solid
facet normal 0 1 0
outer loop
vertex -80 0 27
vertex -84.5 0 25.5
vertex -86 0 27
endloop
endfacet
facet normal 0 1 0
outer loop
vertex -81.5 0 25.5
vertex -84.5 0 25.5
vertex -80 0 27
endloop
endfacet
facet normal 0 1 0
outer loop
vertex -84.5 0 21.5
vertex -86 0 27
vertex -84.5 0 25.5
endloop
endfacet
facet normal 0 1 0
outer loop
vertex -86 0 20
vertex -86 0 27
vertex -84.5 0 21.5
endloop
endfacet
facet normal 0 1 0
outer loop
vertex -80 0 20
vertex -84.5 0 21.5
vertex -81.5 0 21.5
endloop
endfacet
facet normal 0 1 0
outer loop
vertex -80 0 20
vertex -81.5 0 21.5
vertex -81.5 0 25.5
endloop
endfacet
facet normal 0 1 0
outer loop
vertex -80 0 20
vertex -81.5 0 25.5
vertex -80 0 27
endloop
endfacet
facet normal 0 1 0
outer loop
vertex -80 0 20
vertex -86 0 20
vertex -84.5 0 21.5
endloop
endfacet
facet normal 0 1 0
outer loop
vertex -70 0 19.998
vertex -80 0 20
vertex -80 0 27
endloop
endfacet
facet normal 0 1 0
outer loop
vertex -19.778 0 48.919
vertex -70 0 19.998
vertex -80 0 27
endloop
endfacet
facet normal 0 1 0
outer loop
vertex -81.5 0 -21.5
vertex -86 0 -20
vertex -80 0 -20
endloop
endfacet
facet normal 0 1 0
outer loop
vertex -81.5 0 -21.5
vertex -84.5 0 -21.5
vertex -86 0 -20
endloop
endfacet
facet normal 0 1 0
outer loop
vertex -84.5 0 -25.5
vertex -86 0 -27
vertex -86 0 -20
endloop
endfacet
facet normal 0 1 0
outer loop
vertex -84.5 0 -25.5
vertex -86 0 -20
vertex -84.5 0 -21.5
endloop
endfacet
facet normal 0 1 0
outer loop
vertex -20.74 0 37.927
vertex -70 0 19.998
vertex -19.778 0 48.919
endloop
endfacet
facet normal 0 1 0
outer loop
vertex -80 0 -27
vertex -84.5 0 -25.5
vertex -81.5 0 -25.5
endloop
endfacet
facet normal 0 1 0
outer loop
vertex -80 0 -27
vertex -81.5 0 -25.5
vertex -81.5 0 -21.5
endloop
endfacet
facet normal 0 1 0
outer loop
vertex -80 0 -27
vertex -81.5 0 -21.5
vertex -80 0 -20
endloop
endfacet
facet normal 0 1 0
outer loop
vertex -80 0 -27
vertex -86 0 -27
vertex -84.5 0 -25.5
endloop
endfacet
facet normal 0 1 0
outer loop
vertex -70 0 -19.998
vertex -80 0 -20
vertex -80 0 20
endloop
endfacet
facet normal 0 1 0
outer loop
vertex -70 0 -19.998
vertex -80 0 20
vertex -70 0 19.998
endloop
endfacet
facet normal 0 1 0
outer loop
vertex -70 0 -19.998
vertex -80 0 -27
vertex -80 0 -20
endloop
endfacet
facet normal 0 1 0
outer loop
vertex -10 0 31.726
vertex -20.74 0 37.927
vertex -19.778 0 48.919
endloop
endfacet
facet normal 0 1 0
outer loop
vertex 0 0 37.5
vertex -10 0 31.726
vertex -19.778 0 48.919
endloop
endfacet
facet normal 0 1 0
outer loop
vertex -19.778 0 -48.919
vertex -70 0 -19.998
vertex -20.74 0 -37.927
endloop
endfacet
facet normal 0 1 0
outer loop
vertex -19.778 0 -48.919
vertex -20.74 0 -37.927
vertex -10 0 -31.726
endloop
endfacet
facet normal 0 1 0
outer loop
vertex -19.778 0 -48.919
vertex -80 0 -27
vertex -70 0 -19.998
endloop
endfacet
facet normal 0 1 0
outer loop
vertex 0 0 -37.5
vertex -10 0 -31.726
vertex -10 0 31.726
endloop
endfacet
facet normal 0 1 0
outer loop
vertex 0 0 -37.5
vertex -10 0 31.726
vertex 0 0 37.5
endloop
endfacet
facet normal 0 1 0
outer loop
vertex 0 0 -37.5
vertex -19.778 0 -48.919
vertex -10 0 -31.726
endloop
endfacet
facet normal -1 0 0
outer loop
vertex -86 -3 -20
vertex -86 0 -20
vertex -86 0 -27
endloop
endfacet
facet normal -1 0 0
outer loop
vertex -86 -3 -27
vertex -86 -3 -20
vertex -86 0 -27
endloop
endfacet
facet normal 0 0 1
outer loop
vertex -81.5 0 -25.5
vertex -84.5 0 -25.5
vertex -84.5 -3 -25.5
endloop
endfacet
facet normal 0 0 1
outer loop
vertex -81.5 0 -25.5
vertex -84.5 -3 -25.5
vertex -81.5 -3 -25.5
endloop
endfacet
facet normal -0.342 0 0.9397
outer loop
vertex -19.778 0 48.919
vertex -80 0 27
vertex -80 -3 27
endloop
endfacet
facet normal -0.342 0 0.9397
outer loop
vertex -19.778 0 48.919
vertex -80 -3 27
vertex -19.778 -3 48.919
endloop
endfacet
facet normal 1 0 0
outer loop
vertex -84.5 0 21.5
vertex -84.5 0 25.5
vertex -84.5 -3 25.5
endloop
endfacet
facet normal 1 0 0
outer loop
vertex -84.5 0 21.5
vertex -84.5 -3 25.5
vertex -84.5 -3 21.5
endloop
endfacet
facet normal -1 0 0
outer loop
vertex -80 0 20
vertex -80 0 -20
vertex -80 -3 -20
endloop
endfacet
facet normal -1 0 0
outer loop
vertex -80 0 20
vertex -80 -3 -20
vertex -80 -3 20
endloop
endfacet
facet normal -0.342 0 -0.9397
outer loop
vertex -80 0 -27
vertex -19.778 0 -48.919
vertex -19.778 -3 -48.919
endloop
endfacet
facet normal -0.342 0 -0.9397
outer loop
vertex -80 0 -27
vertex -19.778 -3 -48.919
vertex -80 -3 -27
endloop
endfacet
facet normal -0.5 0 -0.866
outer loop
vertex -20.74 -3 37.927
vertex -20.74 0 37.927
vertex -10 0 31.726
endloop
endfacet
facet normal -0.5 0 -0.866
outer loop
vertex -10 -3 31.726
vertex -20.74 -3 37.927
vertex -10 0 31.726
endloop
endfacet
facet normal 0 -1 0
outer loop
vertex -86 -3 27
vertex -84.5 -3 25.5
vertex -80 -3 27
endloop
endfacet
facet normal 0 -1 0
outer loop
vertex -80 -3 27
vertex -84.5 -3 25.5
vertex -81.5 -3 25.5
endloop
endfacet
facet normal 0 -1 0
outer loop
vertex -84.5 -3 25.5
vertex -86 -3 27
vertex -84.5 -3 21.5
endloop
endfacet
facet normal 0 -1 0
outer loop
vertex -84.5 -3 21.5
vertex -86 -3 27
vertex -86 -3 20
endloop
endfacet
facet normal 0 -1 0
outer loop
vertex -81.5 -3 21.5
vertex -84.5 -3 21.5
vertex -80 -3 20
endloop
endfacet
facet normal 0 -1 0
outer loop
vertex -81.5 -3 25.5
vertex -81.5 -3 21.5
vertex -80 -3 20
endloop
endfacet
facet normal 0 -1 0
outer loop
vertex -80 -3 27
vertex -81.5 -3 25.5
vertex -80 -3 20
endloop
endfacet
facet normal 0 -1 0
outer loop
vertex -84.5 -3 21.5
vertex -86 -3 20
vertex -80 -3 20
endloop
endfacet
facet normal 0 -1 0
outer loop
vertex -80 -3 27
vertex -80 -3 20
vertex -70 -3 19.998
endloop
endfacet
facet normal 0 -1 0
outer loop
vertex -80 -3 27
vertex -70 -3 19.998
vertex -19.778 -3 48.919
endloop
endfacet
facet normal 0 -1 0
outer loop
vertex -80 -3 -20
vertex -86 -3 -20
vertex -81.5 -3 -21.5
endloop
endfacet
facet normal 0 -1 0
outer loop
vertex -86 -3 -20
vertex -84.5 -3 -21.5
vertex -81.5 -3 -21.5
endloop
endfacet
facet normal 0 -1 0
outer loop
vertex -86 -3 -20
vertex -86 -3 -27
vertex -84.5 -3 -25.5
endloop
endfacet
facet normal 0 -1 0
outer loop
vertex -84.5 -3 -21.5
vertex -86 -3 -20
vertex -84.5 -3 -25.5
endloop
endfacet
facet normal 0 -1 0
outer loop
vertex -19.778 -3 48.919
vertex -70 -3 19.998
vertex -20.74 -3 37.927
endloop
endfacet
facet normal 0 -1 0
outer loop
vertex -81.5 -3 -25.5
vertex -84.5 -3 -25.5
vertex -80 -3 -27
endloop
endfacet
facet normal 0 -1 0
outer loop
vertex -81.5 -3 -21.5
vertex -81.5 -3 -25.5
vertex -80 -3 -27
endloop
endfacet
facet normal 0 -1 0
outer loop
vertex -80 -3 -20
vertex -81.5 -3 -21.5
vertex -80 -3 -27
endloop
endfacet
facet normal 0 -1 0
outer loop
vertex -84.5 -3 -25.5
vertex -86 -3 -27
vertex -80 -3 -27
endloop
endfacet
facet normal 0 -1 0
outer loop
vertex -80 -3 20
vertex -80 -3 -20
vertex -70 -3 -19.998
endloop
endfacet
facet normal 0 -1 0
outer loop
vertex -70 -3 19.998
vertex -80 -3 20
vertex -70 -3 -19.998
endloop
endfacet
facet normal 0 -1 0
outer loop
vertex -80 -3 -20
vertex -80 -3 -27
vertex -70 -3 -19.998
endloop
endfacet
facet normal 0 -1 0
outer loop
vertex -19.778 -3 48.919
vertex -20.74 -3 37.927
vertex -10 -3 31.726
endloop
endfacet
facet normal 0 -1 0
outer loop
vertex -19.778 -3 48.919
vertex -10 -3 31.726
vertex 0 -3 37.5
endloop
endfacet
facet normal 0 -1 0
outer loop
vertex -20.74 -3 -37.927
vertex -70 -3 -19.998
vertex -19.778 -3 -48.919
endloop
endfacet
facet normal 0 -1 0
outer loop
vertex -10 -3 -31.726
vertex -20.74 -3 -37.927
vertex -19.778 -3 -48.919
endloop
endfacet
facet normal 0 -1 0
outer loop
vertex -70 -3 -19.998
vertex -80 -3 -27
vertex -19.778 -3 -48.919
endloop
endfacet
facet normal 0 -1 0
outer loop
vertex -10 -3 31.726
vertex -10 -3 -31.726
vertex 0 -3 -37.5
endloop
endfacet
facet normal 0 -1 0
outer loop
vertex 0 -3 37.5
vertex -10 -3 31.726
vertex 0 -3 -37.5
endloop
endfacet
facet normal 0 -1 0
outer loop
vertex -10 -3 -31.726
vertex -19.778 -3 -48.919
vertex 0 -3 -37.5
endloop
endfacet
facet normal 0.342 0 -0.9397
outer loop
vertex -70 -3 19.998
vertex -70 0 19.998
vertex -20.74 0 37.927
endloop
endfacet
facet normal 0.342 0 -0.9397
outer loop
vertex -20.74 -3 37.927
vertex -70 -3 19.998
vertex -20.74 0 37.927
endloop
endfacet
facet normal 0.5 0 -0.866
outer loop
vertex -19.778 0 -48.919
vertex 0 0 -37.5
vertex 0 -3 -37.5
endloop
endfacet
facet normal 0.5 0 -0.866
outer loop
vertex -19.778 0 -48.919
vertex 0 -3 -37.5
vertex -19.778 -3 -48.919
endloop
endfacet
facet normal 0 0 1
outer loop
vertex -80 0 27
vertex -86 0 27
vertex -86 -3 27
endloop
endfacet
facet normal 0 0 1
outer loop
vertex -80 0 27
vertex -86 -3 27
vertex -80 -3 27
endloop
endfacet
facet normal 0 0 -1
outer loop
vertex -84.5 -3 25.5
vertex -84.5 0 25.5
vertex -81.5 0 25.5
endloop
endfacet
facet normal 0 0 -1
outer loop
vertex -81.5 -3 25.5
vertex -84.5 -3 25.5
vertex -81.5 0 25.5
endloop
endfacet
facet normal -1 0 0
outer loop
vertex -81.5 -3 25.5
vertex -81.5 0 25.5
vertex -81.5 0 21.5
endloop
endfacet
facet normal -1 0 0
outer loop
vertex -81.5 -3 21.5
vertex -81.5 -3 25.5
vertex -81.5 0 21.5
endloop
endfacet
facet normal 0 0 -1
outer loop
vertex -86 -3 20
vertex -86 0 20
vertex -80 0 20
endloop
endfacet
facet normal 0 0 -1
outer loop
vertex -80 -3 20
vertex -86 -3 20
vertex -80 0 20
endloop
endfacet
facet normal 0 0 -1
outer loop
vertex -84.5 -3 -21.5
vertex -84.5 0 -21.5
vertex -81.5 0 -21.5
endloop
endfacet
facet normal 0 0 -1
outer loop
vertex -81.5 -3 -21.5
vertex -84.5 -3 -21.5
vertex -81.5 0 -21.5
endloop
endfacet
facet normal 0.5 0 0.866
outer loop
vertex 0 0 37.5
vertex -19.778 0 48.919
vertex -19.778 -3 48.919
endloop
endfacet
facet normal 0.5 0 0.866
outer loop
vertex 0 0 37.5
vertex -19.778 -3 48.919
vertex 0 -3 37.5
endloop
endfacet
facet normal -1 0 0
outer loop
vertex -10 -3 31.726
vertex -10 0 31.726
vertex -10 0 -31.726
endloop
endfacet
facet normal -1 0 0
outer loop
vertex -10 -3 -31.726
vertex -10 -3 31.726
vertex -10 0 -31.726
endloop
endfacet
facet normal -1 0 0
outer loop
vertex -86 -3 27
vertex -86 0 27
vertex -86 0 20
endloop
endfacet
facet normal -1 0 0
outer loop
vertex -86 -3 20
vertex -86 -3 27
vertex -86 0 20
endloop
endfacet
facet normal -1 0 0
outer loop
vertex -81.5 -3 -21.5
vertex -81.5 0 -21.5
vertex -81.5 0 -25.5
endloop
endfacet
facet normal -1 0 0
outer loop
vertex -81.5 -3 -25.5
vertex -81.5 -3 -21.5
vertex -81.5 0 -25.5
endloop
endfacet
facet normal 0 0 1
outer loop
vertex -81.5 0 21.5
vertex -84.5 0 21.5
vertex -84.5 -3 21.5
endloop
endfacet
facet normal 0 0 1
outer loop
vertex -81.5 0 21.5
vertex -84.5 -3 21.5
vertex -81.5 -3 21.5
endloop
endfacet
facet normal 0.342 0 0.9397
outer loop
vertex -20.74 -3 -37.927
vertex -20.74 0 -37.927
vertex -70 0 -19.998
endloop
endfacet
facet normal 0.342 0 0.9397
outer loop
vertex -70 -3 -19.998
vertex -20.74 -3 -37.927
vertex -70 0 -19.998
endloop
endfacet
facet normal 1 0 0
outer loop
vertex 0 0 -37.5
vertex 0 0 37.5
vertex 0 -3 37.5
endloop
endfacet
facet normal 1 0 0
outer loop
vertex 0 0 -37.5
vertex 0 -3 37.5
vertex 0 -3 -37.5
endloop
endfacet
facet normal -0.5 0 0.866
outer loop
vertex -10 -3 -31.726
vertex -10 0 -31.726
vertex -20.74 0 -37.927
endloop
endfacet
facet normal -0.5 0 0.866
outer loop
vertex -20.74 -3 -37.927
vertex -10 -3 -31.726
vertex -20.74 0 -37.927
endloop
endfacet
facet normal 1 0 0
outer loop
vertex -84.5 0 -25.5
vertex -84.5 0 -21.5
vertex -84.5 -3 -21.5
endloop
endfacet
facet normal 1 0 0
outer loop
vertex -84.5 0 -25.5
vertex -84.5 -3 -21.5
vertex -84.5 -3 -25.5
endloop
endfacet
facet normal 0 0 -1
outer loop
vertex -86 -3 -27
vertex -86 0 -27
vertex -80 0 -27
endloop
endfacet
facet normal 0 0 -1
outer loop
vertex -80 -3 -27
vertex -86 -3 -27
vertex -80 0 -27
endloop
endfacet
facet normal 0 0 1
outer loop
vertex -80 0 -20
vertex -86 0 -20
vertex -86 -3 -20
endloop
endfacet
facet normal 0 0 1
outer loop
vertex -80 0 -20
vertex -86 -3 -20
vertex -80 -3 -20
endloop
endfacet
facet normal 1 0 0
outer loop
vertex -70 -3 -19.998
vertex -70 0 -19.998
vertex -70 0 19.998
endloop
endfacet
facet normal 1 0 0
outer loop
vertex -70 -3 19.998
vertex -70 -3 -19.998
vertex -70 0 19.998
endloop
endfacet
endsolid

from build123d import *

# Parameters (mm, degrees)
BOSS_EXTRUDE1_DEPTH = 3
BOSS_EXTRUDE2_DEPTH = 83
CUT_EXTRUDE1_DEPTH  = 81
SKETCH8_W           = 6
SKETCH8_H           = 7
SKETCH8_W_2         = 3
SKETCH8_H_2         = 4
BOSS_EXTRUDE4_DEPTH = 3


with BuildPart() as part:
    # Sketch2 → Boss-Extrude1 (new body)
    with BuildSketch(Plane(origin=(0, 0, 0), x_dir=(0, 0, -1), z_dir=(0, -1, 0))):
        Polygon((-37.5, 0), (37.5, 0), (48.918945144, -19.778193158), (27, -80), (-27, -80), (-48.918945144, -19.778193158), align=None)
        Polygon((-31.726497308, -10), (31.726497308, -10), (37.927152815, -20.739850379), (19.997924618, -70), (-19.997924618, -70), (-37.927152815, -20.739850379), align=None, mode=Mode.SUBTRACT)
    extrude(amount=BOSS_EXTRUDE1_DEPTH)

    # Sketch8 → Boss-Extrude4 (add)
    # profile 1 of 2: a face of its own
    with BuildSketch(Plane(origin=(0, 0, 0), x_dir=(1, 0, 0), z_dir=(0, 1, 0))):
        with Locations((-83, 23.5)):
            Rectangle(SKETCH8_W, SKETCH8_H)
        with Locations((-83, 23.5)):
            Rectangle(SKETCH8_W_2, SKETCH8_H_2, mode=Mode.SUBTRACT)
    # profile 2 of 2: a face of its own
    with BuildSketch(Plane(origin=(0, 0, 0), x_dir=(1, 0, 0), z_dir=(0, 1, 0))):
        with Locations((-83, -23.5)):
            Rectangle(SKETCH8_W, SKETCH8_H)
        with Locations((-83, -23.5)):
            Rectangle(SKETCH8_W_2, SKETCH8_H_2, mode=Mode.SUBTRACT)
    extrude(amount=-BOSS_EXTRUDE4_DEPTH)


with BuildPart() as body_2:
    # Sketch3 → Boss-Extrude2 (new body)
    with BuildSketch(Plane(origin=(-95, 0, 0), x_dir=(0, -1, 0), z_dir=(-1, 0, 0))):
        Polygon((13, 27), (0, 27), (0, -27), (13, -27), (13, -24), (3, -24), (3, 24), (13, 24), align=None)
    extrude(amount=BOSS_EXTRUDE2_DEPTH)

    # Sketch4 → Cut-Extrude1 (cut)
    with BuildSketch(Plane(origin=(-178, 0, 0), x_dir=(0, -1, 0), z_dir=(-1, 0, 0))):
        Polygon((2, 27), (1, 27), (1, 25), (2, 25), (4.25, 25), (4.25, 26), (2, 26), align=None)
        Polygon((4.25, -26), (2, -26), (2, -27), (1, -27), (1, -25), (2, -25), (4.25, -25), align=None)
    extrude(amount=-CUT_EXTRUDE1_DEPTH, mode=Mode.SUBTRACT)


solid = part.part
